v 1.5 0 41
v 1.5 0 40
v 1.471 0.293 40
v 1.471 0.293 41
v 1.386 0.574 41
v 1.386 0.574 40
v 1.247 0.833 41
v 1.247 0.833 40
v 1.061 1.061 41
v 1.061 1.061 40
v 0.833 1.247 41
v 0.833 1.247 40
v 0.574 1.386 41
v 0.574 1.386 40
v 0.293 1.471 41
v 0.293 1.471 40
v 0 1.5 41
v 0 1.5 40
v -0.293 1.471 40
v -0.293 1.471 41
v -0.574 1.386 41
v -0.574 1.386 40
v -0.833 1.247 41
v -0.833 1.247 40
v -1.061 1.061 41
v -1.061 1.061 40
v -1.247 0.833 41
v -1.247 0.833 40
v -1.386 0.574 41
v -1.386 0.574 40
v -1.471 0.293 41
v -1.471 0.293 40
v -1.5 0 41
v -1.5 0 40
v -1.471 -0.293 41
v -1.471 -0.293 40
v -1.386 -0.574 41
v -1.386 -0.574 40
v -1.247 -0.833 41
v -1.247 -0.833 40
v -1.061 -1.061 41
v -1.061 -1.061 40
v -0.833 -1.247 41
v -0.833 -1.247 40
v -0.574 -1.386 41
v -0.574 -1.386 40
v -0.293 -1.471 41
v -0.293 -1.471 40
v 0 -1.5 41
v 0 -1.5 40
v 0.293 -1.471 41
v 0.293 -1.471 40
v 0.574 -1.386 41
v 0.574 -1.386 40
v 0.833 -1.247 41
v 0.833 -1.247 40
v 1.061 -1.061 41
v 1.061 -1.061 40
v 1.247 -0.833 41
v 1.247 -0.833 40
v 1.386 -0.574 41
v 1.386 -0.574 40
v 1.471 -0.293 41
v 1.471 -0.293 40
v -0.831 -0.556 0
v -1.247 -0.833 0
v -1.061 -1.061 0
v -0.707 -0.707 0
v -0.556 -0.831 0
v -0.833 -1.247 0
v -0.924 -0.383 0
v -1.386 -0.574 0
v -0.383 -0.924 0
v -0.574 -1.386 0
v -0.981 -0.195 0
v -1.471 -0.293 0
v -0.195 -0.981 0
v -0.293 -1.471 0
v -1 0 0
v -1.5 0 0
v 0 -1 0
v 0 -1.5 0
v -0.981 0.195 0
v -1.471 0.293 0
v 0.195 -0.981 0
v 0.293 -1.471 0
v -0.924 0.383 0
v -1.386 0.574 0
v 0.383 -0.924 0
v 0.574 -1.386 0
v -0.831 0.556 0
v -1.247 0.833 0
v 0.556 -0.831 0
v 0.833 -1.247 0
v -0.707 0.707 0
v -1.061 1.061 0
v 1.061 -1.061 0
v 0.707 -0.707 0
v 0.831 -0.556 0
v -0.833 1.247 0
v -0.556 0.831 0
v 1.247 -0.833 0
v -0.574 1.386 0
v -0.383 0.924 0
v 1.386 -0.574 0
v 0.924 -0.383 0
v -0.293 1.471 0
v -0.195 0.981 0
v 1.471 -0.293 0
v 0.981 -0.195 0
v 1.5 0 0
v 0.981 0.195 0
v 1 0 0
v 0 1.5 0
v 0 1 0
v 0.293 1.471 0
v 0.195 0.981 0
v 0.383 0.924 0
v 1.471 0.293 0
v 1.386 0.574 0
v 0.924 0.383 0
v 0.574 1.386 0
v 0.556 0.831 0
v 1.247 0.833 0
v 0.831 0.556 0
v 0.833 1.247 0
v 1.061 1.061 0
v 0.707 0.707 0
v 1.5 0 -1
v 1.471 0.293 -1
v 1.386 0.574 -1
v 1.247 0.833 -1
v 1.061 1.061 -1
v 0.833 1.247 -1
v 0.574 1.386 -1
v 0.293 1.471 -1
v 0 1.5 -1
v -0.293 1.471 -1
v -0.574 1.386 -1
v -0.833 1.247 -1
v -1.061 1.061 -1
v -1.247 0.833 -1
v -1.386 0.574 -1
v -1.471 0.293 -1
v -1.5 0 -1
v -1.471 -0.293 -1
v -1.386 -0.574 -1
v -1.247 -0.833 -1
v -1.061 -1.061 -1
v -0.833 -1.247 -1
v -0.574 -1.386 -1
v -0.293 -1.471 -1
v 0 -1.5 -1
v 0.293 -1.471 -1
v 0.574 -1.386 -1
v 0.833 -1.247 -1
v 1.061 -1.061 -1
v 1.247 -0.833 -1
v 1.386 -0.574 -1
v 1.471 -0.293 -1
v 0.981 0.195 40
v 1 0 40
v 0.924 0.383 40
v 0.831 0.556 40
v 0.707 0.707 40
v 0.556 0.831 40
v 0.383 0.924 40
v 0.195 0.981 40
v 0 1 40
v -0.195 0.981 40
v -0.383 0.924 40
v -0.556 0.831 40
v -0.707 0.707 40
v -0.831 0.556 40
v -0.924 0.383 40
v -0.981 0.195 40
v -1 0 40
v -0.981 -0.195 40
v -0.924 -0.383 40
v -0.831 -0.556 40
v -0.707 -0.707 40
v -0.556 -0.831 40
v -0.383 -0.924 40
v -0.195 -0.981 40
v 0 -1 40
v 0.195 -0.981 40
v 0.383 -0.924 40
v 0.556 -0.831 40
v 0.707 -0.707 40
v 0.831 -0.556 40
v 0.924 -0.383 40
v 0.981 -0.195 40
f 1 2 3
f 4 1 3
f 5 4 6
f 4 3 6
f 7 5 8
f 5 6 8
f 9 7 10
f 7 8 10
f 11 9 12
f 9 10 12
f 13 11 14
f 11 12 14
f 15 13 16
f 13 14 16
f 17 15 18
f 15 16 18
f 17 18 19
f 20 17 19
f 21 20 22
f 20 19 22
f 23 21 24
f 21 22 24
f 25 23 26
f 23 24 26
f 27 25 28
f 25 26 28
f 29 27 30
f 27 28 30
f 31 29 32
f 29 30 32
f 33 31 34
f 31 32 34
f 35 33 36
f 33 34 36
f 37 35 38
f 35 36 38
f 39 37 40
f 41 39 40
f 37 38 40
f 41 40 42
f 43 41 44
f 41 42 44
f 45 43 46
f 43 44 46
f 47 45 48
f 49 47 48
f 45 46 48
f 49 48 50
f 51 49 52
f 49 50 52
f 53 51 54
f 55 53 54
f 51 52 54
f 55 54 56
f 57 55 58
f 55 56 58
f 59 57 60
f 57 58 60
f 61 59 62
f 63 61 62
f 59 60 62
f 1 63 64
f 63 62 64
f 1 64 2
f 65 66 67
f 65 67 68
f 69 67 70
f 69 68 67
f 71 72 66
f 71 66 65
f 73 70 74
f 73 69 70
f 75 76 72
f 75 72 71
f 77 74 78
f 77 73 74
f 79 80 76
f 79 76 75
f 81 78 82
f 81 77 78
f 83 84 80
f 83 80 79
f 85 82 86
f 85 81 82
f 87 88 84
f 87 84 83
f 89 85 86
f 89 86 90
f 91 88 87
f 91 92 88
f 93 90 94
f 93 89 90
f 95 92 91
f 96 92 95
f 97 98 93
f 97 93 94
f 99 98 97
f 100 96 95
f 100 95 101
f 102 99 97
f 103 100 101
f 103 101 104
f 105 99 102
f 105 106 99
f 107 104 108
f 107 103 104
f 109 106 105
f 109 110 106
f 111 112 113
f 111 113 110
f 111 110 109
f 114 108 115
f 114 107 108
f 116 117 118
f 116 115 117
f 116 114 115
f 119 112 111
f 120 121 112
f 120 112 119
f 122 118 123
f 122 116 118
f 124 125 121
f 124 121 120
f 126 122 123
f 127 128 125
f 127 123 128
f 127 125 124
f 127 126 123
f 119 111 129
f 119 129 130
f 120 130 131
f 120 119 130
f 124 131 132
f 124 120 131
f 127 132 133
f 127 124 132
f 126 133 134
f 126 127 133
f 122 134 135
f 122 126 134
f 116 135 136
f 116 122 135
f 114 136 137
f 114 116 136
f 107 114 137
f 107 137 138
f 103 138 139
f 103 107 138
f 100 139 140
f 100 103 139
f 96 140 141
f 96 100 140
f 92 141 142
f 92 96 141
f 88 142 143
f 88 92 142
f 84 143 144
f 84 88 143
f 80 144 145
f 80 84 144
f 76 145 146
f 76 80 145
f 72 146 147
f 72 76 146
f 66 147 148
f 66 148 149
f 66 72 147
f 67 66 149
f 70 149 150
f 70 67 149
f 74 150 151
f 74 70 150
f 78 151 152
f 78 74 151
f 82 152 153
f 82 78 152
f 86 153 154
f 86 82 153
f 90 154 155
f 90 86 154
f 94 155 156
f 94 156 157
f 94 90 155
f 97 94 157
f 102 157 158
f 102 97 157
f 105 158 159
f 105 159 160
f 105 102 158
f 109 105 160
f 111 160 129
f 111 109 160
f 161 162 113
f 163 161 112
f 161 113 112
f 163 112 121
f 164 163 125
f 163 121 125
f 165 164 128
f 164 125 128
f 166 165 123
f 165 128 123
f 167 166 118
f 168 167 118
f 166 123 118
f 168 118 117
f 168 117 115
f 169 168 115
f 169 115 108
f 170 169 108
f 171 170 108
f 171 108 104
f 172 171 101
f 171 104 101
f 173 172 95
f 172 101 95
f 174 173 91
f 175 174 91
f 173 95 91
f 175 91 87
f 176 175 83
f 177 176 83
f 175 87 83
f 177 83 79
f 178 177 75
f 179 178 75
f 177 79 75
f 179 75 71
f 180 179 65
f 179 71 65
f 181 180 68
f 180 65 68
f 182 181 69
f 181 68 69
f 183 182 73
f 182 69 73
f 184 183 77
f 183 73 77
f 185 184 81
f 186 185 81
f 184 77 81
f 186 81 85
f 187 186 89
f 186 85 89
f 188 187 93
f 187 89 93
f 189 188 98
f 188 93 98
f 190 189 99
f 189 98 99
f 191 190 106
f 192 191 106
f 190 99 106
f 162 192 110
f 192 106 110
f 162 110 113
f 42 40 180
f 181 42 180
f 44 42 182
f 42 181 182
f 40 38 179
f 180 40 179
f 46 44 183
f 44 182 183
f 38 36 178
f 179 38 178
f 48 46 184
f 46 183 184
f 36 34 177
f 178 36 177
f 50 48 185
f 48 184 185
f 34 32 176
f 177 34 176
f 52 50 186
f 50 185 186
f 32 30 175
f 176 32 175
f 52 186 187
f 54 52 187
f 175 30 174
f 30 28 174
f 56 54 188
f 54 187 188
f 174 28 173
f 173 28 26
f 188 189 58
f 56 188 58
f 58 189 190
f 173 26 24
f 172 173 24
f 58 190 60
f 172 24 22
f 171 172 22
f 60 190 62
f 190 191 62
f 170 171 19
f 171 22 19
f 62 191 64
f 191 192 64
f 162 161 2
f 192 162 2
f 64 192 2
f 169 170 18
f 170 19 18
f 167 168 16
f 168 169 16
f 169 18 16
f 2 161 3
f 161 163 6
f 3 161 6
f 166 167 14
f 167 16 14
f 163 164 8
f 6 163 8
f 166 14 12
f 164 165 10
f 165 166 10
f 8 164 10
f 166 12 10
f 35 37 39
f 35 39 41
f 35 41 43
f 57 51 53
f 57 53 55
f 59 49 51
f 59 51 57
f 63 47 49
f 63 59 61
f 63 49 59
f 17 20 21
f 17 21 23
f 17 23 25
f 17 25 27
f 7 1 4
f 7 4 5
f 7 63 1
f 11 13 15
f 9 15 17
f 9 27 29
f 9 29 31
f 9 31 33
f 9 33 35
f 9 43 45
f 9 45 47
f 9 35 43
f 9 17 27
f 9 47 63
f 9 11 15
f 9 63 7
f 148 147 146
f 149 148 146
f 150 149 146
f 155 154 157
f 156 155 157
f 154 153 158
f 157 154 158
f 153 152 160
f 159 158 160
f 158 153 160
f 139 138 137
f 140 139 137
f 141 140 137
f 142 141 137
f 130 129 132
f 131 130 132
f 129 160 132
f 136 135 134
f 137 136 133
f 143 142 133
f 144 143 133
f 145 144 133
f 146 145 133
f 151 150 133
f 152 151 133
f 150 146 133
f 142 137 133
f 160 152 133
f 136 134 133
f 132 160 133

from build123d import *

# Parameters (mm, degrees)
ESQUISSE1_R        = 1
BOSS_EXTRU_1_DEPTH = 40
ESQUISSE2_R        = 1.5
BOSS_EXTRU_2_DEPTH = 1


with BuildPart() as part:
    # Esquisse1 → Boss.-Extru.1 (new body)
    with BuildSketch(Plane.XY):
        Circle(ESQUISSE1_R)
    extrude(amount=BOSS_EXTRU_1_DEPTH)

    # Esquisse2 → Boss.-Extru.2 (add)
    with BuildSketch(Plane.XY.offset(40)):
        Circle(ESQUISSE2_R)
    boss_extru_2 = extrude(amount=BOSS_EXTRU_2_DEPTH)

    # Symétrie1: Boss.-Extru.2 across plane
    add(boss_extru_2.mirror(Plane(origin=(0, 0, 20), x_dir=(1, 0, 0), z_dir=(0, 0, -1))))


solid = part.part
